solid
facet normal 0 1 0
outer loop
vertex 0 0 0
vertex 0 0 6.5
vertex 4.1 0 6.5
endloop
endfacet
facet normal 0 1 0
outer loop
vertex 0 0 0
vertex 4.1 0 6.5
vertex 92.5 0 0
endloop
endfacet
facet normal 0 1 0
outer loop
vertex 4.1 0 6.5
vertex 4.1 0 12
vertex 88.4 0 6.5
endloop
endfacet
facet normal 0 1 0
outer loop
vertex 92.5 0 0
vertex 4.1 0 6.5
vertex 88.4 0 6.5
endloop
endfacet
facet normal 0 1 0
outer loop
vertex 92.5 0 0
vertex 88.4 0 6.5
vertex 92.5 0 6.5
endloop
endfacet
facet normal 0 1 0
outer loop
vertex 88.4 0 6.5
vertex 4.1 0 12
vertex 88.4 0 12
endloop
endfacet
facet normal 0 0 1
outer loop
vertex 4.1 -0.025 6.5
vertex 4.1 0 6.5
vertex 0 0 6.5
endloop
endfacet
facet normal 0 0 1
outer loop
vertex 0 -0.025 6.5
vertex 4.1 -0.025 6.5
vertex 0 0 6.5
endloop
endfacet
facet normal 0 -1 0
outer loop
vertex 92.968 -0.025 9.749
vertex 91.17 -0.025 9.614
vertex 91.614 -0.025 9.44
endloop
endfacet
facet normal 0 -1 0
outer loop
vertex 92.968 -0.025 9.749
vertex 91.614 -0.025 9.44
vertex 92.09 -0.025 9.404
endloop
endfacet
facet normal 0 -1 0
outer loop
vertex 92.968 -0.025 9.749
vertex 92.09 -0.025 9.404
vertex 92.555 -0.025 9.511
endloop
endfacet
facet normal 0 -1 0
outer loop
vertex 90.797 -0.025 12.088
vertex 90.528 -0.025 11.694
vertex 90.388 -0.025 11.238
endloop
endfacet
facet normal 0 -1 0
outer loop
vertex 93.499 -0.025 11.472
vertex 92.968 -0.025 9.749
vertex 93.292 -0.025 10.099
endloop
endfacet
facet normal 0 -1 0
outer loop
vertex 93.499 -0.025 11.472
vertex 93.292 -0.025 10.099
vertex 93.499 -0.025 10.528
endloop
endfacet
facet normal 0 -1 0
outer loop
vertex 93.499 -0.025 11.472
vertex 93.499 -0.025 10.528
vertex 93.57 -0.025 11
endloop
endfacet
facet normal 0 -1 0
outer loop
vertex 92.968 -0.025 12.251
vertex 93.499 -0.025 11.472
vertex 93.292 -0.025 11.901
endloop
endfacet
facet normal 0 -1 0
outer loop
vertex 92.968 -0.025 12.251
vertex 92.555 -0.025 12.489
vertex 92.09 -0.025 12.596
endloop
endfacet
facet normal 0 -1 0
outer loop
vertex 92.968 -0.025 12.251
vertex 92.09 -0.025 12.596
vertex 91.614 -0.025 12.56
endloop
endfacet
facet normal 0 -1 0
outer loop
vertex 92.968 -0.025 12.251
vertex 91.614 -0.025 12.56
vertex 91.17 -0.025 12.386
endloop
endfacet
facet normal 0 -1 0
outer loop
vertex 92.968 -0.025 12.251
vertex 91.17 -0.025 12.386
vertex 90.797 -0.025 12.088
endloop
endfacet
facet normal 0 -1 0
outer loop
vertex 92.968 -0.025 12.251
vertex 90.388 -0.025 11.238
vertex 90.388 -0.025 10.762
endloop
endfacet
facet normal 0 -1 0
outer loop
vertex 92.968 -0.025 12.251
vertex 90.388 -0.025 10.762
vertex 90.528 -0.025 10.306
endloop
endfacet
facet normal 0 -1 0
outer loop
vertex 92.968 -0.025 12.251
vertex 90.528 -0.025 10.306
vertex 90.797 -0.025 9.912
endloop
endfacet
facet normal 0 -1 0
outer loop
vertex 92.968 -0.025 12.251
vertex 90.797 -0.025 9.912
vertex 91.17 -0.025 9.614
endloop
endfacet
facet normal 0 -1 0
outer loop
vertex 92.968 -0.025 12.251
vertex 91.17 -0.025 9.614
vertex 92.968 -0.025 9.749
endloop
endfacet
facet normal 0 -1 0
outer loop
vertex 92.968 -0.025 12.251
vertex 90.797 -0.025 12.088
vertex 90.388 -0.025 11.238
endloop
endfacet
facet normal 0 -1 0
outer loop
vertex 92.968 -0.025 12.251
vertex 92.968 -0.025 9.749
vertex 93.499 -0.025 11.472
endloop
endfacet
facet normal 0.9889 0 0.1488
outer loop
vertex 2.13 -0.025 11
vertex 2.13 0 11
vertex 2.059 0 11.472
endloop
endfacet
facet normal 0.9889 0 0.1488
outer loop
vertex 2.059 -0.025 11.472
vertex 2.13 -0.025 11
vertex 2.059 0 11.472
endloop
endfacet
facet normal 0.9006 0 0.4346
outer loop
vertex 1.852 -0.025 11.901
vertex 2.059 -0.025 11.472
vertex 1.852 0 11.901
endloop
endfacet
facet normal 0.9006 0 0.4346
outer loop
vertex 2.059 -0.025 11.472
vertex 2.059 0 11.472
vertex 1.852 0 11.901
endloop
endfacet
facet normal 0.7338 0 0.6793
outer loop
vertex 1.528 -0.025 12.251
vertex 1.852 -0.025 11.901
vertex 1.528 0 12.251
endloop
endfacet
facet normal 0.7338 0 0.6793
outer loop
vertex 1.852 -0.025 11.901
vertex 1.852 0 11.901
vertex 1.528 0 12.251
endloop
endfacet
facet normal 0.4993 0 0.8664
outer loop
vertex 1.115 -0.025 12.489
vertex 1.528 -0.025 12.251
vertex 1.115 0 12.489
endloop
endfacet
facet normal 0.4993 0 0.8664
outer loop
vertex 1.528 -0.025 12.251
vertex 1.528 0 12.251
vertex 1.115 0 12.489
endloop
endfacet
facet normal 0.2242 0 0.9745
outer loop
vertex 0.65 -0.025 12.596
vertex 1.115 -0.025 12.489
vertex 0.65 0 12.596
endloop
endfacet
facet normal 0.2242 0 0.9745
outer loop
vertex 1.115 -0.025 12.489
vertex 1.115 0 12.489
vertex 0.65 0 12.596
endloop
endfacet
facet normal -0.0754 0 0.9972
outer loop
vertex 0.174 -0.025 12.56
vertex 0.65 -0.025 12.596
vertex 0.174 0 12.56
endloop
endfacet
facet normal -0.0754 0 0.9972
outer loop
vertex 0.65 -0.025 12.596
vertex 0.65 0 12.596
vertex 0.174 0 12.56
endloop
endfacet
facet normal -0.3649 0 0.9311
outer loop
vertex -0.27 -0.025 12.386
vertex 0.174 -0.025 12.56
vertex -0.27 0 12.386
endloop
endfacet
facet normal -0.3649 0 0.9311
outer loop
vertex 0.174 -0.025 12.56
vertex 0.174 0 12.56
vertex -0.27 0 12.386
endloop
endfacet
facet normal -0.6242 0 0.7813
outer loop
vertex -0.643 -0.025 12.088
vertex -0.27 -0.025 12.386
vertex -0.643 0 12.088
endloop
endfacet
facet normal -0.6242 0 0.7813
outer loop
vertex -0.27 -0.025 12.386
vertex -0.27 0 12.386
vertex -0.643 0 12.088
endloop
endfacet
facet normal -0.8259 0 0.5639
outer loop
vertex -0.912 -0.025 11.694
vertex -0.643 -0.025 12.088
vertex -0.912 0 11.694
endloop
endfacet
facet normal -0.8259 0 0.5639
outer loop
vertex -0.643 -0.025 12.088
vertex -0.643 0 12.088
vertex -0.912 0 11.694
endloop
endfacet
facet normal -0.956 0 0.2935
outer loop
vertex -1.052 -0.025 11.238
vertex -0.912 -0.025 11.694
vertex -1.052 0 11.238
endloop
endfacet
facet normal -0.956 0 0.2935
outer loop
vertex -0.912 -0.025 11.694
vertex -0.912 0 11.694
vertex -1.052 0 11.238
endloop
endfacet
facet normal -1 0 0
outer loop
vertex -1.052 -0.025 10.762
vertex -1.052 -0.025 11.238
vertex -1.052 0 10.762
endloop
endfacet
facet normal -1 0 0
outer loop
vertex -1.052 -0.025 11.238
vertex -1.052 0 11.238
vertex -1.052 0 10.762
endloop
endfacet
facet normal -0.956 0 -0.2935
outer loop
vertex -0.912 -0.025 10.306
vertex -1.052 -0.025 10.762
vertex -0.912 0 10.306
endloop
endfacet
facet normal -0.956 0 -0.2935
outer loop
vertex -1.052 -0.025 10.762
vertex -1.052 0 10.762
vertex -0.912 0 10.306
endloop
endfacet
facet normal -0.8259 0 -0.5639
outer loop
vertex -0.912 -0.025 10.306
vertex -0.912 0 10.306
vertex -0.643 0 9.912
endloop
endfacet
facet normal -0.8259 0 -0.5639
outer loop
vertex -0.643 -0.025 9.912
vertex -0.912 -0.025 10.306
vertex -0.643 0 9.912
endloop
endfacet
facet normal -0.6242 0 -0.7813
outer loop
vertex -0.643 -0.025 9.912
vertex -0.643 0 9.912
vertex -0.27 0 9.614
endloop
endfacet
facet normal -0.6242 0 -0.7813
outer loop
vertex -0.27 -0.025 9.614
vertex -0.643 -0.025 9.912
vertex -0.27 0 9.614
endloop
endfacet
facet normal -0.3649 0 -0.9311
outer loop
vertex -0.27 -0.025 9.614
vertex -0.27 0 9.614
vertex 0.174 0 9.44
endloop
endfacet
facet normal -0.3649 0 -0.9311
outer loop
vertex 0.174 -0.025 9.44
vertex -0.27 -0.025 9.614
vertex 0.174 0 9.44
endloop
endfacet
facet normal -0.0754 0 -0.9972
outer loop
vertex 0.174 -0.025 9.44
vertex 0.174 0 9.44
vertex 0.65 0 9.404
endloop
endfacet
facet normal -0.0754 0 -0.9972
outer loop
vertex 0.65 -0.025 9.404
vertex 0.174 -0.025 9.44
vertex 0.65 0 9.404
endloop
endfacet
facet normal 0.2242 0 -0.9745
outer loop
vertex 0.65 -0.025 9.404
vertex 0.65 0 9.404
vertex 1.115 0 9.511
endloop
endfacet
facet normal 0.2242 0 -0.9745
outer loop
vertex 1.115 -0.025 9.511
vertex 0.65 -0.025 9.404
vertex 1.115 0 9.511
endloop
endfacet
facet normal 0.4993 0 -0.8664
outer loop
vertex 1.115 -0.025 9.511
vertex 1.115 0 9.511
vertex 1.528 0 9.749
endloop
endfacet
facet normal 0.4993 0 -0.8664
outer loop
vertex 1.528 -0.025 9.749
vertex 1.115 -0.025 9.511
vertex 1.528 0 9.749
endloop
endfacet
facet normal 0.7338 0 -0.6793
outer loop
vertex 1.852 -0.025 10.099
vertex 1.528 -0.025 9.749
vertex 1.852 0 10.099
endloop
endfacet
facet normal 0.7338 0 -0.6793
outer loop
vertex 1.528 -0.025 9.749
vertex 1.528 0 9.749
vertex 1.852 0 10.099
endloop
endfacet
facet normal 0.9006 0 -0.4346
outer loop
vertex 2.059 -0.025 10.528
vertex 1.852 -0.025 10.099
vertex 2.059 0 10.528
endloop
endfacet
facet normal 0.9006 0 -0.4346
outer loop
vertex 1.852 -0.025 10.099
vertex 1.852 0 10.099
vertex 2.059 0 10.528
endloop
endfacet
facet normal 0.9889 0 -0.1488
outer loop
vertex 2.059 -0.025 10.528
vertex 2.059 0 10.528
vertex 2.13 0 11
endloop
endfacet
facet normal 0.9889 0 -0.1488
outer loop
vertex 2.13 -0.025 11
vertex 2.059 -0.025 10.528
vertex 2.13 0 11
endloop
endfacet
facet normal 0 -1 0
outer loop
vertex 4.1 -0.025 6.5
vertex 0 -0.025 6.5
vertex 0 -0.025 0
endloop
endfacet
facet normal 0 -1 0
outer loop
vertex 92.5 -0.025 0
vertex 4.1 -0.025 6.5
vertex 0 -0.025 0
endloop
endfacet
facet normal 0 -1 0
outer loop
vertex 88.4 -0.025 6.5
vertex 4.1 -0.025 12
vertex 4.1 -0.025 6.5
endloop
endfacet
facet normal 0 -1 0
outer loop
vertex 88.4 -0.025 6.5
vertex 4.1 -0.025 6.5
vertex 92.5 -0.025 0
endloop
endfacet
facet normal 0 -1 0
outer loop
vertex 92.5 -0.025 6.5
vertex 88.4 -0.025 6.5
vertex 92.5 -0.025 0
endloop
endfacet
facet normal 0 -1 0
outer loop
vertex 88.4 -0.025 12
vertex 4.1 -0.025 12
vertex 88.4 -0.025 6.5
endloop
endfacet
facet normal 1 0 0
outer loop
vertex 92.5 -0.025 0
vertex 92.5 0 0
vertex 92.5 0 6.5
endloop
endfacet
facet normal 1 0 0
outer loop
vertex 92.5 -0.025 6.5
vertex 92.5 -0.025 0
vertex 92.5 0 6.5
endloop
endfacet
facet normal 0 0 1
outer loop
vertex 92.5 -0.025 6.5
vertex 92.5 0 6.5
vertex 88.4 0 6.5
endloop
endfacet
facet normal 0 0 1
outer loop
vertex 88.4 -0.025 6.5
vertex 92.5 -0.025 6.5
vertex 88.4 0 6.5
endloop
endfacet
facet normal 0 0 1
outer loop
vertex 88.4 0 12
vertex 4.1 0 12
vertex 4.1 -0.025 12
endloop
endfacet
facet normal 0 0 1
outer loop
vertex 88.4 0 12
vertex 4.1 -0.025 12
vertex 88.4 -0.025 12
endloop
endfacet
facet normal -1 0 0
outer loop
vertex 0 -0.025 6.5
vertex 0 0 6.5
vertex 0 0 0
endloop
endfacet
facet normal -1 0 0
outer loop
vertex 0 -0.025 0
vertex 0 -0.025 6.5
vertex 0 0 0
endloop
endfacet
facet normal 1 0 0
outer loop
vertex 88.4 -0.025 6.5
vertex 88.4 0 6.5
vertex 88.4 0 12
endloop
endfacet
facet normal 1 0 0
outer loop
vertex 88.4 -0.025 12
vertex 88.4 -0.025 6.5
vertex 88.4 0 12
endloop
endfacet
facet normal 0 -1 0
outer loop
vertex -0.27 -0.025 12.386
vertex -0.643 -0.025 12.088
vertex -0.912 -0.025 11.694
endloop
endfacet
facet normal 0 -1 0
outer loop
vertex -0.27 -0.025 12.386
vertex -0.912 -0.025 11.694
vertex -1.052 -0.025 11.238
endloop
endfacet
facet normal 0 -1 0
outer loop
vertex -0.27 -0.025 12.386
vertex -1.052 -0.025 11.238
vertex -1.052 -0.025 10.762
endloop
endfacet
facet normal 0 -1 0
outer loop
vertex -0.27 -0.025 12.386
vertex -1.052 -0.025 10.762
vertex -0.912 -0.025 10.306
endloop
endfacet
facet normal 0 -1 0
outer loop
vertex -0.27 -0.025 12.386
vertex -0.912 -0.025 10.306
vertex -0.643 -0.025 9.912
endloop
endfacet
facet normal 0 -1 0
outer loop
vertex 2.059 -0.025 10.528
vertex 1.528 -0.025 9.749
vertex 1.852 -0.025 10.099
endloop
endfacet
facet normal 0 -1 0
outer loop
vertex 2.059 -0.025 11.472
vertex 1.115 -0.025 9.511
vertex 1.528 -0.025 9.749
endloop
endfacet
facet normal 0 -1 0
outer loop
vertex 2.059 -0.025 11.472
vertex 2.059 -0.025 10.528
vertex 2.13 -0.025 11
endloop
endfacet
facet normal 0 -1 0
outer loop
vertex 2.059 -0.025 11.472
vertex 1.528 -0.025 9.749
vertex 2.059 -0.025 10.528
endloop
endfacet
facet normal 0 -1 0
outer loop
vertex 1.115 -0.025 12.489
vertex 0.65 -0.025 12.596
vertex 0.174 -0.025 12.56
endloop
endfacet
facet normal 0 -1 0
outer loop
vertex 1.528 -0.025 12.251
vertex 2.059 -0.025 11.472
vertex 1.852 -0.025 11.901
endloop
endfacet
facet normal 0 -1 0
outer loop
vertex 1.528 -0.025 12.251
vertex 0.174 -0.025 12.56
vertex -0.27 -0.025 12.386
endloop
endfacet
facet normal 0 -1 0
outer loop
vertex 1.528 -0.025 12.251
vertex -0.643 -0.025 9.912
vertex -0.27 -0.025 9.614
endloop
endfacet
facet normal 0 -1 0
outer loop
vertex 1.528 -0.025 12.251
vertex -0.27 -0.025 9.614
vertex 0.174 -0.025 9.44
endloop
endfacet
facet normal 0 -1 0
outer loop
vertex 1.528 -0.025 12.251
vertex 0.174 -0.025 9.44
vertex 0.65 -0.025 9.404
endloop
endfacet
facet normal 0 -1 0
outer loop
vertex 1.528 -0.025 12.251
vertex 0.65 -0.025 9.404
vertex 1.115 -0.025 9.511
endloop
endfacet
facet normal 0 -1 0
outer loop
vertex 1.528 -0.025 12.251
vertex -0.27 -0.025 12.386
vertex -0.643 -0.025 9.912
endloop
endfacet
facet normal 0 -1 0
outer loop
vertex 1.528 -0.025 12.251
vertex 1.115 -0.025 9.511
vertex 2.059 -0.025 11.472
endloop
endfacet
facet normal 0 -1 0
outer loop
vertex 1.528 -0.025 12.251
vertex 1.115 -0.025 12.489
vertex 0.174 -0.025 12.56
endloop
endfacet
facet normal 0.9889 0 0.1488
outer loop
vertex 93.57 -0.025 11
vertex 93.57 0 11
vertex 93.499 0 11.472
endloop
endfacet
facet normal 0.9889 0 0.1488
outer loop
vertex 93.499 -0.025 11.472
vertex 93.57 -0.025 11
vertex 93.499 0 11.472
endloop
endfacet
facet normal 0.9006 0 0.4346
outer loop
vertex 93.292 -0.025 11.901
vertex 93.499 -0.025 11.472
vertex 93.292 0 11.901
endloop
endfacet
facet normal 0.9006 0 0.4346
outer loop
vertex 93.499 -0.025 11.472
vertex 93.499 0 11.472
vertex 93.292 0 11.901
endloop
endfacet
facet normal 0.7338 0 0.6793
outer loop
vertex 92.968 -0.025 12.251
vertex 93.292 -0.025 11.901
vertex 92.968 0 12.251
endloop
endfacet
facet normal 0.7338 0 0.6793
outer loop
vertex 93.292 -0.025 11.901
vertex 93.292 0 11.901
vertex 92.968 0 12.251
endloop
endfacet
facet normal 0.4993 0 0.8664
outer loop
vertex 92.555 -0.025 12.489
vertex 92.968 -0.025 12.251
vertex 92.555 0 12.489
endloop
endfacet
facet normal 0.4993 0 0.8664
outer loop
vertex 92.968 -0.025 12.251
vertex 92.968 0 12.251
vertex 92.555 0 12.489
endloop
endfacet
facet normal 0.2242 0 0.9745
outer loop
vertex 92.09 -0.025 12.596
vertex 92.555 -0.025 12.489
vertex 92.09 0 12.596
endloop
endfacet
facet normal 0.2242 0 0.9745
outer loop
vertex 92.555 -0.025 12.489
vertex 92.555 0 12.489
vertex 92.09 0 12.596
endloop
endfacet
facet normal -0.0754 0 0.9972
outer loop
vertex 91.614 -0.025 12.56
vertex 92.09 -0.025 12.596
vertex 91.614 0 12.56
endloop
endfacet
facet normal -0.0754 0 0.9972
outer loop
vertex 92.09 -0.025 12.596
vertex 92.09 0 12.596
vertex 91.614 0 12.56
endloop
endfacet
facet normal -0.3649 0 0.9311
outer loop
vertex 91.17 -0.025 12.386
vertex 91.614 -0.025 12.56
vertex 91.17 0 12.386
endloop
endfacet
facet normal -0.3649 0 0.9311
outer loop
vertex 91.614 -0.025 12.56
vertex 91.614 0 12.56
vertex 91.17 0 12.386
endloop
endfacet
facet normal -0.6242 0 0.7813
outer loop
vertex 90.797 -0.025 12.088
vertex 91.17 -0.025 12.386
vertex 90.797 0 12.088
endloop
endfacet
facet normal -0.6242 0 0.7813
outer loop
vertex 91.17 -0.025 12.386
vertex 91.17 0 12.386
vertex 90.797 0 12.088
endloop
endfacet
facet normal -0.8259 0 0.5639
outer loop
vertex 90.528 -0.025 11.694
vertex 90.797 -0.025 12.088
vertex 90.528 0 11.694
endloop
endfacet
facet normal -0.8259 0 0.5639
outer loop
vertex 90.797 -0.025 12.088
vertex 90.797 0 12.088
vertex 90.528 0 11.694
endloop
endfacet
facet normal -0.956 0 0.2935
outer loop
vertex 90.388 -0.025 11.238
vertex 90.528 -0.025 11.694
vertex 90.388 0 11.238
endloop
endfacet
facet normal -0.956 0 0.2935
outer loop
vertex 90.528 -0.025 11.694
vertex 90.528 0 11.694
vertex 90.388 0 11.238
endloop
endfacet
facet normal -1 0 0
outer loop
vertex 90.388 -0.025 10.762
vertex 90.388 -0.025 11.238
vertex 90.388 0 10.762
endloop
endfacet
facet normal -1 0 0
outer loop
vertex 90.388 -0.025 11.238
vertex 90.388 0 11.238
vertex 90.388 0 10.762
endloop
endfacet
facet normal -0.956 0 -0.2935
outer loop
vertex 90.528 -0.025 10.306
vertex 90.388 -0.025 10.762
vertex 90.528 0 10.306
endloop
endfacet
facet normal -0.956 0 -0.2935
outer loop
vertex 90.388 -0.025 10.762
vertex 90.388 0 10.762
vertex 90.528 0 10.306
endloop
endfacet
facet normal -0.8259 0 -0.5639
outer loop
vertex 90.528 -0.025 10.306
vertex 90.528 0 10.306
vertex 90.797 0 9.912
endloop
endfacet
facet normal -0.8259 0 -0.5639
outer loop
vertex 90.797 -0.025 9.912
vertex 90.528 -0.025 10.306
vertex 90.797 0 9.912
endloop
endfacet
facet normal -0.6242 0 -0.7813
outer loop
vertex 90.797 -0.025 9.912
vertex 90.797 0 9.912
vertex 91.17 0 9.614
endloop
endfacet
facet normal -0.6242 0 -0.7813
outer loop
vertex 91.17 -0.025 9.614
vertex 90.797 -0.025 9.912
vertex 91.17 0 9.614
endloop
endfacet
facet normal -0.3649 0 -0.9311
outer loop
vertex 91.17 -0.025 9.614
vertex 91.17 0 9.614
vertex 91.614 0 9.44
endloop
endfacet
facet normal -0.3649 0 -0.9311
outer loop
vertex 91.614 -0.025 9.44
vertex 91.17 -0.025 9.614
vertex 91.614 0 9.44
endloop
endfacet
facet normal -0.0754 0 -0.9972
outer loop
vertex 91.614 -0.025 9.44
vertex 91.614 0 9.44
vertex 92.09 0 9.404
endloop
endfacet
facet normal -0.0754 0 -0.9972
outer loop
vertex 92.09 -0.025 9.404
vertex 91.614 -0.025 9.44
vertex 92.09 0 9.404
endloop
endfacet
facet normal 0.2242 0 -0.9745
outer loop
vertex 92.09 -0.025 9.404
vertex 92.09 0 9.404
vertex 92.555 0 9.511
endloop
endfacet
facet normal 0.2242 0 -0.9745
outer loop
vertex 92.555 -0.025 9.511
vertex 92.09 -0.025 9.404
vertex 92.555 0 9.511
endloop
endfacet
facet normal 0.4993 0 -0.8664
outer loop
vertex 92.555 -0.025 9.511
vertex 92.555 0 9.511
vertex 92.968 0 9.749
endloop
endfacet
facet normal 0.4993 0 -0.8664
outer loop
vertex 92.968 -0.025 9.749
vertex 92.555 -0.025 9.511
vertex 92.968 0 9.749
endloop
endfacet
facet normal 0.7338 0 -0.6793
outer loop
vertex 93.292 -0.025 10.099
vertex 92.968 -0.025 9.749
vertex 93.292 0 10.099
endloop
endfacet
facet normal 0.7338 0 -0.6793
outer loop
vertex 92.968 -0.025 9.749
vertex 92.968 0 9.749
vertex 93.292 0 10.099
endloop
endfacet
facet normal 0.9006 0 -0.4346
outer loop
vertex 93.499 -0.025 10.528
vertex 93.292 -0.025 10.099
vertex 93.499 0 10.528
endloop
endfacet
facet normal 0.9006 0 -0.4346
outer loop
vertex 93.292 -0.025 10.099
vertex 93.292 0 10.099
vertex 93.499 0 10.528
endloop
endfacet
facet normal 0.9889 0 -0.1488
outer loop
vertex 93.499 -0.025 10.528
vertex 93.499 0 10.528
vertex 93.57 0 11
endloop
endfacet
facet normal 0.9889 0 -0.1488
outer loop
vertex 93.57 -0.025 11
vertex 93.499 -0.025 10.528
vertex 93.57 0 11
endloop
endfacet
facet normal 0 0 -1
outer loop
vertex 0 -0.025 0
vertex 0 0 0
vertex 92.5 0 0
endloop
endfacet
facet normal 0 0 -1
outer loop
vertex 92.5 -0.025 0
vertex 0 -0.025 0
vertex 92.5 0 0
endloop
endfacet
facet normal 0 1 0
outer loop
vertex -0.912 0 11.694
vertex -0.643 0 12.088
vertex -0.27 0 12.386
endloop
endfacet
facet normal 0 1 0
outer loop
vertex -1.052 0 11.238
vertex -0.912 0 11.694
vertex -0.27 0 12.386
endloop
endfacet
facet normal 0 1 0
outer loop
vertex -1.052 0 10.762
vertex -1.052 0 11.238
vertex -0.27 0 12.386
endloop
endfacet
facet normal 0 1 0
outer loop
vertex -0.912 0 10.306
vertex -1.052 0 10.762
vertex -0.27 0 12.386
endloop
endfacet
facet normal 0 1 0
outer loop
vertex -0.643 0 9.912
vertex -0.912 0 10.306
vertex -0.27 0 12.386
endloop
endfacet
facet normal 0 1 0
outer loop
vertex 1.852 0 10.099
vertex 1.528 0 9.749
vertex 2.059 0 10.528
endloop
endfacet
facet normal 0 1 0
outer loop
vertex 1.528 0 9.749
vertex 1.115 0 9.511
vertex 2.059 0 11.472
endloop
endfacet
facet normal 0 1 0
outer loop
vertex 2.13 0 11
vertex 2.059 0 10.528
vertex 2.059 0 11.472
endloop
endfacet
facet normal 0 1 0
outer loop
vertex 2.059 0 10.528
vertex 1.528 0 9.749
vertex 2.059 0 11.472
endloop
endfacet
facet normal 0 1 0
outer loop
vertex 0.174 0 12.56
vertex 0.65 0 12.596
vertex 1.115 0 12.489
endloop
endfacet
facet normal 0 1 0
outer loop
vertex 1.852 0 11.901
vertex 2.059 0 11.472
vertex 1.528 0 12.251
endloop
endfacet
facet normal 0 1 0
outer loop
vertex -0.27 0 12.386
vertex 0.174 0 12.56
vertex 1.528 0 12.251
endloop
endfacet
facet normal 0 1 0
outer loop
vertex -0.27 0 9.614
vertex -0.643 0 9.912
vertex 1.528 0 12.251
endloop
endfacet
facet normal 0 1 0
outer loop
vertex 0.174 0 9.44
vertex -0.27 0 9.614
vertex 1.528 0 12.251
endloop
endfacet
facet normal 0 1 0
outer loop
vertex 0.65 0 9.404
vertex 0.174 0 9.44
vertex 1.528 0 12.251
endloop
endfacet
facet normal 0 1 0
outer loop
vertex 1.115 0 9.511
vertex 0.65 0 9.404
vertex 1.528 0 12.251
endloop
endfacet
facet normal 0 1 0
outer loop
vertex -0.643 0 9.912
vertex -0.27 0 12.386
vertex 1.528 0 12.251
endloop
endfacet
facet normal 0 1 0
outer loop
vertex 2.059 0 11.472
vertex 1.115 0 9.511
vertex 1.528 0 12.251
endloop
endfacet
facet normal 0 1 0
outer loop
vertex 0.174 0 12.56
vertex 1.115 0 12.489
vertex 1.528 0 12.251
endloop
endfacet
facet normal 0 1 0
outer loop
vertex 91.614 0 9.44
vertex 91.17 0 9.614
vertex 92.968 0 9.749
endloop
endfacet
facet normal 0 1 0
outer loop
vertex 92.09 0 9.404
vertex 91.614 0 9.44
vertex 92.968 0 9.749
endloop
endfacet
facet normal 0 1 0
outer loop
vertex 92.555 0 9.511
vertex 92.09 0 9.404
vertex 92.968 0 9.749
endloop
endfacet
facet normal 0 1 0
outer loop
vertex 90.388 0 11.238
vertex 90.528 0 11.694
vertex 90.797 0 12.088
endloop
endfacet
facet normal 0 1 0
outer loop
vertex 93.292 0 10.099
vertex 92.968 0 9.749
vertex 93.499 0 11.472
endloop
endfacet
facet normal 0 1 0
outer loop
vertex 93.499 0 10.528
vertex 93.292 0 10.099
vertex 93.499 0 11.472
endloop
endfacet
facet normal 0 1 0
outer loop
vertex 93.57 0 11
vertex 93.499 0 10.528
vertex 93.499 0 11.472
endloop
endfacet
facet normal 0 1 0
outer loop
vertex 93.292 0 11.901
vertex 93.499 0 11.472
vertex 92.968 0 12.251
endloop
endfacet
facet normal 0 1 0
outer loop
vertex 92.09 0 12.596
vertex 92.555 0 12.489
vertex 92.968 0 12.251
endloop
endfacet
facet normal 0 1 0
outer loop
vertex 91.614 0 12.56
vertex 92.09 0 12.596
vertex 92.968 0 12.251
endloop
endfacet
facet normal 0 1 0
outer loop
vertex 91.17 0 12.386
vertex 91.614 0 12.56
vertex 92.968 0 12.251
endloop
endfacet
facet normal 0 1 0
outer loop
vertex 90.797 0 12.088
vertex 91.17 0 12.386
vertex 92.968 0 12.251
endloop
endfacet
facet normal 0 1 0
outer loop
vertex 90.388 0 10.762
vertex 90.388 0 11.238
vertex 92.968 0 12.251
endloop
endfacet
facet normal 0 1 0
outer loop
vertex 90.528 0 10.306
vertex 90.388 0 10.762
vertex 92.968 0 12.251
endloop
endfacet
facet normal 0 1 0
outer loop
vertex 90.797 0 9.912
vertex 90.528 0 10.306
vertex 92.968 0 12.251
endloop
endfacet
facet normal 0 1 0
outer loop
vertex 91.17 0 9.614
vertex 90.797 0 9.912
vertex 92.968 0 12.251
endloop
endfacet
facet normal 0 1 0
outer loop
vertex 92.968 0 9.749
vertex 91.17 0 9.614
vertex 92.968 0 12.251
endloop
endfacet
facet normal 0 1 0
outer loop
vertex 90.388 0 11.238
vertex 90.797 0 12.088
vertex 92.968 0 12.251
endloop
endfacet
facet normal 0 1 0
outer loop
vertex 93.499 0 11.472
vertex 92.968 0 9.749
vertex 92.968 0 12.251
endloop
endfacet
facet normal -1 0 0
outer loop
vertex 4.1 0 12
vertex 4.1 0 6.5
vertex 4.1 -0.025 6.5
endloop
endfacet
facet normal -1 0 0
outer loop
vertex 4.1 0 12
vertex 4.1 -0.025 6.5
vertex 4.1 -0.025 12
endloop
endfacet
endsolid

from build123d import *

# Parameters (mm, degrees)
F0_W     = 84.3
F0_H     = 5.5
F0_R     = 1.6
F1_DEPTH = 0.0254


with BuildPart() as f1:
    # F0 (on Front) → F1 (new body)
    with BuildSketch(Plane.XZ):
        Polygon((0, 6.5), (0, 0), (92.5, 0), (92.5, 6.5), (88.4, 6.5), (4.1, 6.5), align=None)
        with Locations((46.25, 9.25)):
            Rectangle(F0_W, F0_H)
        with Locations((0.53, 11)):
            Circle(F0_R)
        with Locations((91.97, 11)):
            Circle(F0_R)
    extrude(amount=F1_DEPTH)


solid = f1.part
